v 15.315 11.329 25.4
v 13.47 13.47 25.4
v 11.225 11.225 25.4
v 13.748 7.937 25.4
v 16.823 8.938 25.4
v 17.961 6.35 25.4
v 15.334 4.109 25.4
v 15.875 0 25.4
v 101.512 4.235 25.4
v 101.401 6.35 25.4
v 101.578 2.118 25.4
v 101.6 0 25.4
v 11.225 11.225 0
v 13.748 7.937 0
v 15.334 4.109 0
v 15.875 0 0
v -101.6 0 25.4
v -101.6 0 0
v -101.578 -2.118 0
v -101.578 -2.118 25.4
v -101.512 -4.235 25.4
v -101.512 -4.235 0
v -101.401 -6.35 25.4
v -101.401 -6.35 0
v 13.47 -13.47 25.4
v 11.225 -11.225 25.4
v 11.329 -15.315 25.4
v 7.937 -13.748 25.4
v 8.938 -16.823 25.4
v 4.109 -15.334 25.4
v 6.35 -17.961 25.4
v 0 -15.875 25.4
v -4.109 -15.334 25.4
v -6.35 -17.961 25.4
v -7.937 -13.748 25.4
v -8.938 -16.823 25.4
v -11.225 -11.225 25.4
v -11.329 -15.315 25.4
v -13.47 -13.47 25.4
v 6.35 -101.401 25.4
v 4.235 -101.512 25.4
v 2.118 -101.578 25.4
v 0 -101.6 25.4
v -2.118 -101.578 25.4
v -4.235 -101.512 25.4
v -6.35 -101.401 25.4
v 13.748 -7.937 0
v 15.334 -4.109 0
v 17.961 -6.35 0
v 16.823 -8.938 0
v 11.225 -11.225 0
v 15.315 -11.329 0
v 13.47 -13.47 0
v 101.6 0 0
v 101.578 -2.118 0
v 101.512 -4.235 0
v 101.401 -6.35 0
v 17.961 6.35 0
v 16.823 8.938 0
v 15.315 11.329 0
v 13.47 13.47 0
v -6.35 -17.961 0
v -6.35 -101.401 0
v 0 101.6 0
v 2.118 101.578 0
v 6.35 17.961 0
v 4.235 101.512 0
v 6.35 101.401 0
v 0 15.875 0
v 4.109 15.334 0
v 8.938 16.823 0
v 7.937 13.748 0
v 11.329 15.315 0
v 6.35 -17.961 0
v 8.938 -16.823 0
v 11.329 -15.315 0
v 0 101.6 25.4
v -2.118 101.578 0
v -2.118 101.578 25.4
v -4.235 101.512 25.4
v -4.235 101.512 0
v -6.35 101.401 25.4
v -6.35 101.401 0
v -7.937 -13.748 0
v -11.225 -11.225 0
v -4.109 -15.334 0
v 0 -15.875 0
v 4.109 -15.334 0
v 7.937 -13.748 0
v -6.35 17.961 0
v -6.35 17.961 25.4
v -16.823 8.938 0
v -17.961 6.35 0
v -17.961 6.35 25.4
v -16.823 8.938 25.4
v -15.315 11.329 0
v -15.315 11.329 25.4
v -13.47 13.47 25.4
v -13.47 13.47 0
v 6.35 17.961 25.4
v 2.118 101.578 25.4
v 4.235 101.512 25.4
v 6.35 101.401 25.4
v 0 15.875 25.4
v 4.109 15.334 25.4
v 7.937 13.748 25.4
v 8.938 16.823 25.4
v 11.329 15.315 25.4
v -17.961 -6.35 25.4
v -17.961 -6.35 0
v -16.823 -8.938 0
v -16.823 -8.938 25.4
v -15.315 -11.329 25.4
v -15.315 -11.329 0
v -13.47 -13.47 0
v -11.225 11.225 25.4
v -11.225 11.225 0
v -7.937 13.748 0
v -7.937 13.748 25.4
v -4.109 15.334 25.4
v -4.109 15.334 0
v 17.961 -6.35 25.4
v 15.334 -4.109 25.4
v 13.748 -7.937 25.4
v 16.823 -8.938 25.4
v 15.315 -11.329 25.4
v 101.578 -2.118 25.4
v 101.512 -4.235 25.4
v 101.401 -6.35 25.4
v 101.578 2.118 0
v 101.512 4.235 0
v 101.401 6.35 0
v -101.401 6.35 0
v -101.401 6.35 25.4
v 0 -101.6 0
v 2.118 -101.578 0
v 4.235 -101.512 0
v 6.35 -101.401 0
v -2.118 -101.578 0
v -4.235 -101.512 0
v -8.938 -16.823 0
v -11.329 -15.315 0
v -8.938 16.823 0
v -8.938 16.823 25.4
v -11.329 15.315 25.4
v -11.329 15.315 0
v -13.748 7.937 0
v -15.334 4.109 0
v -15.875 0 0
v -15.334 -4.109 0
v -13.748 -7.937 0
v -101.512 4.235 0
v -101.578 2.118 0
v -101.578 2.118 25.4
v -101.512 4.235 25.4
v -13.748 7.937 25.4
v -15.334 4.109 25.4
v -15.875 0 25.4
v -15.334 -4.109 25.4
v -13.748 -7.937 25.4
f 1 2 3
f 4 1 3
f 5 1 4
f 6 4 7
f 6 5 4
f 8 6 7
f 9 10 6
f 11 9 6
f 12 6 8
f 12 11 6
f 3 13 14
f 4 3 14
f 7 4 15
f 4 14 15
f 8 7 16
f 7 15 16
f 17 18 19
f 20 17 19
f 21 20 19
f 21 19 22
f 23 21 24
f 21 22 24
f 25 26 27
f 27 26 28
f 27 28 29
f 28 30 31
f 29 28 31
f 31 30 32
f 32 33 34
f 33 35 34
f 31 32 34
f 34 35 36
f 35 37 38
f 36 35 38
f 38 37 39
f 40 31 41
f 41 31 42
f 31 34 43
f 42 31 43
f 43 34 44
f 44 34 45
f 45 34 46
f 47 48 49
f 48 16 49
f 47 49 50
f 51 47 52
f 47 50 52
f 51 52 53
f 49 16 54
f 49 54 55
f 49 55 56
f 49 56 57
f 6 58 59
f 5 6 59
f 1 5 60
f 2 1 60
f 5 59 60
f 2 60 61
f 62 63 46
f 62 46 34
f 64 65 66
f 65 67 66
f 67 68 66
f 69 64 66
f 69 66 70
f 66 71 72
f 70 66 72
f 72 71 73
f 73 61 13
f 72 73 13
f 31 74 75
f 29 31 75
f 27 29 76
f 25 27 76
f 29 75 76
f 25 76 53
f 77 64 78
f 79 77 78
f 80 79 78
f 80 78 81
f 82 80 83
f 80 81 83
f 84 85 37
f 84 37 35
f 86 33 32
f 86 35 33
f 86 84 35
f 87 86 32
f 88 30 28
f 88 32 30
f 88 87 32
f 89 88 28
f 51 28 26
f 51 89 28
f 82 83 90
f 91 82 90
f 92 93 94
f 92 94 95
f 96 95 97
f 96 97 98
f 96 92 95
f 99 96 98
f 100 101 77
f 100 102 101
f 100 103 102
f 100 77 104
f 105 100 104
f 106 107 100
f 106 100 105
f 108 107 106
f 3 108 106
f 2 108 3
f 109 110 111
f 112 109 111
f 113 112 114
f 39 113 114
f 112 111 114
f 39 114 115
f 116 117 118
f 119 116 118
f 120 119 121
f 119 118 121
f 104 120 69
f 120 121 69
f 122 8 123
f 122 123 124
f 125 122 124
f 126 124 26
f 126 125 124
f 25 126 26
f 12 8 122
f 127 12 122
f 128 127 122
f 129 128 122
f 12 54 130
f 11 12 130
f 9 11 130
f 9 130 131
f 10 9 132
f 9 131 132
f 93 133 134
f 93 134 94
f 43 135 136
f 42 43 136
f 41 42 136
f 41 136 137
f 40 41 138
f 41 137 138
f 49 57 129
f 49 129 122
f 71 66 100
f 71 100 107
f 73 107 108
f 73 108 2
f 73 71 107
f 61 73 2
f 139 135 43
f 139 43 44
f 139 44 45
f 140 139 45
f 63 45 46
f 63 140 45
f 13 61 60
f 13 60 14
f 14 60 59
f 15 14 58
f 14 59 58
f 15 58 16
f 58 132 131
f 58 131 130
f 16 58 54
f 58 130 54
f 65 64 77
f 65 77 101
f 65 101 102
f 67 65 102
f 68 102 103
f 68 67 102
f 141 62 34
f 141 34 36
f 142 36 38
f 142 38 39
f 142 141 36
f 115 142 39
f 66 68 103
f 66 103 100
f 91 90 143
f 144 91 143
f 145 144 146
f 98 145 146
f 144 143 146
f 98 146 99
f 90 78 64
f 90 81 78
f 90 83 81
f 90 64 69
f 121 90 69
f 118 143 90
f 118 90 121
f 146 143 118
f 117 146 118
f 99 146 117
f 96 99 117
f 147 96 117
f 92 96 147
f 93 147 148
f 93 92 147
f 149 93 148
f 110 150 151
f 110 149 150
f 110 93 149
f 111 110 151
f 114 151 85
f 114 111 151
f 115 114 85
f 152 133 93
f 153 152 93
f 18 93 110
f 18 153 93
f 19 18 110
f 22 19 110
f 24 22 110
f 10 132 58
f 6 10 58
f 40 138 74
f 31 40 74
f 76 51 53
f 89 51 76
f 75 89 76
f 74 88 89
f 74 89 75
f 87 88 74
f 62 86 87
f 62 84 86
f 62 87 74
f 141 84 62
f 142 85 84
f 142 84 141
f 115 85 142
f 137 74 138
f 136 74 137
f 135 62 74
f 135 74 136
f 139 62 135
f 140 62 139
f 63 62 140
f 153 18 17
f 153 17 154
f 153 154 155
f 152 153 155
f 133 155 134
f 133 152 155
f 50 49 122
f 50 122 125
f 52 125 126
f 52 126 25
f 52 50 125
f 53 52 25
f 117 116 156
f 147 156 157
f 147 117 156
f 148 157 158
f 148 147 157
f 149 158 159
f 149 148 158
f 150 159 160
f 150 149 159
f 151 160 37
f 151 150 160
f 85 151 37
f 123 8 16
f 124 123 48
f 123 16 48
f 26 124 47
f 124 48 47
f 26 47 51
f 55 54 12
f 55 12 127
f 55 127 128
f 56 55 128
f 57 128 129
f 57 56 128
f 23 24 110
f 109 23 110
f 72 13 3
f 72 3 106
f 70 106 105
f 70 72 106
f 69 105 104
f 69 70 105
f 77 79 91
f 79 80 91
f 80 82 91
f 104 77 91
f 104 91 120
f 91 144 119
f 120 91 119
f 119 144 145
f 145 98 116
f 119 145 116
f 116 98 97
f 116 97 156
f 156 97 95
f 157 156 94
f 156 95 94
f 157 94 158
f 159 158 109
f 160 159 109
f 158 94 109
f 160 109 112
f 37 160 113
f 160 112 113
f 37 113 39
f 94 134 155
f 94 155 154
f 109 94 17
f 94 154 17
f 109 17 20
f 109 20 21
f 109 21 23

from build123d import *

# Parameters (mm, degrees)
F1_DEPTH        = 25.4
F1_COPIES_COUNT = 4


# Not quite as in the source:
# - a feature of the source that left no trace in its solid (it failed there, or was rolled back) is left out
# - a pattern or mirror of a feature is missing from the dataset's text; its kind, count and spacing are read off the source's solid


with BuildPart() as f1:
    # F0 (on Top) → F1 (new body)
    with BuildSketch(Plane.XY):
        with BuildLine():
            ThreePointArc((-11.2253201513, 11.2253201513), (-6.0750994888, 14.6665875786), (0, 15.875))
            Line((0, 15.875), (0, 101.6))
            ThreePointArc((0, 101.6), (-3.1765529485, 101.5503299422), (-6.35, 101.401368334))
            Line((-6.35, 101.401368334), (-6.35, 17.9605122421))
            ThreePointArc((-6.35, 17.9605122421), (-10.1613099439, 16.1136674976), (-13.4703841816, 13.4703841816))
            Line((-13.4703841816, 13.4703841816), (-11.2253201513, 11.2253201513))
        make_face()
    extrude(amount=F1_DEPTH)


with BuildPart() as f1_copies_1:
    # F1_copies: instance of F1
    add(f1.part.rotate(Axis((0, 0, 0), (0, 0, 1)), 1 * 360 / F1_COPIES_COUNT))


with BuildPart() as f1_copies_2:
    # F1_copies: instance of F1
    add(f1.part.rotate(Axis((0, 0, 0), (0, 0, 1)), 2 * 360 / F1_COPIES_COUNT))


with BuildPart() as f1_copies_3:
    # F1_copies: instance of F1
    add(f1.part.rotate(Axis((0, 0, 0), (0, 0, 1)), 3 * 360 / F1_COPIES_COUNT))


with BuildPart() as f1_1:
    add(f1.part)

    add(f1_copies_1.part)  # F1_copies1 merges F1_copies_1
    # F1_copies1: F1 across plane
    add(f1.part.mirror(Plane(origin=(0, 0, 0), x_dir=(0.7071067812, -0.7071067812, 0), z_dir=(-0.7071067812, -0.7071067812, 0))))



with BuildPart() as f1_2:
    add(f1_1.part)

    add(f1_copies_2.part)  # F4 merges F1_copies_2
    # F4: F1 across plane
    add(f1_1.part.mirror(Plane.XZ))



with BuildPart() as f1_3:
    add(f1_2.part)

    add(f1_copies_3.part)  # F5 merges F1_copies_3
    # F5: F1 across plane
    add(f1_2.part.mirror(Plane.YZ))


solid = f1_3.part
